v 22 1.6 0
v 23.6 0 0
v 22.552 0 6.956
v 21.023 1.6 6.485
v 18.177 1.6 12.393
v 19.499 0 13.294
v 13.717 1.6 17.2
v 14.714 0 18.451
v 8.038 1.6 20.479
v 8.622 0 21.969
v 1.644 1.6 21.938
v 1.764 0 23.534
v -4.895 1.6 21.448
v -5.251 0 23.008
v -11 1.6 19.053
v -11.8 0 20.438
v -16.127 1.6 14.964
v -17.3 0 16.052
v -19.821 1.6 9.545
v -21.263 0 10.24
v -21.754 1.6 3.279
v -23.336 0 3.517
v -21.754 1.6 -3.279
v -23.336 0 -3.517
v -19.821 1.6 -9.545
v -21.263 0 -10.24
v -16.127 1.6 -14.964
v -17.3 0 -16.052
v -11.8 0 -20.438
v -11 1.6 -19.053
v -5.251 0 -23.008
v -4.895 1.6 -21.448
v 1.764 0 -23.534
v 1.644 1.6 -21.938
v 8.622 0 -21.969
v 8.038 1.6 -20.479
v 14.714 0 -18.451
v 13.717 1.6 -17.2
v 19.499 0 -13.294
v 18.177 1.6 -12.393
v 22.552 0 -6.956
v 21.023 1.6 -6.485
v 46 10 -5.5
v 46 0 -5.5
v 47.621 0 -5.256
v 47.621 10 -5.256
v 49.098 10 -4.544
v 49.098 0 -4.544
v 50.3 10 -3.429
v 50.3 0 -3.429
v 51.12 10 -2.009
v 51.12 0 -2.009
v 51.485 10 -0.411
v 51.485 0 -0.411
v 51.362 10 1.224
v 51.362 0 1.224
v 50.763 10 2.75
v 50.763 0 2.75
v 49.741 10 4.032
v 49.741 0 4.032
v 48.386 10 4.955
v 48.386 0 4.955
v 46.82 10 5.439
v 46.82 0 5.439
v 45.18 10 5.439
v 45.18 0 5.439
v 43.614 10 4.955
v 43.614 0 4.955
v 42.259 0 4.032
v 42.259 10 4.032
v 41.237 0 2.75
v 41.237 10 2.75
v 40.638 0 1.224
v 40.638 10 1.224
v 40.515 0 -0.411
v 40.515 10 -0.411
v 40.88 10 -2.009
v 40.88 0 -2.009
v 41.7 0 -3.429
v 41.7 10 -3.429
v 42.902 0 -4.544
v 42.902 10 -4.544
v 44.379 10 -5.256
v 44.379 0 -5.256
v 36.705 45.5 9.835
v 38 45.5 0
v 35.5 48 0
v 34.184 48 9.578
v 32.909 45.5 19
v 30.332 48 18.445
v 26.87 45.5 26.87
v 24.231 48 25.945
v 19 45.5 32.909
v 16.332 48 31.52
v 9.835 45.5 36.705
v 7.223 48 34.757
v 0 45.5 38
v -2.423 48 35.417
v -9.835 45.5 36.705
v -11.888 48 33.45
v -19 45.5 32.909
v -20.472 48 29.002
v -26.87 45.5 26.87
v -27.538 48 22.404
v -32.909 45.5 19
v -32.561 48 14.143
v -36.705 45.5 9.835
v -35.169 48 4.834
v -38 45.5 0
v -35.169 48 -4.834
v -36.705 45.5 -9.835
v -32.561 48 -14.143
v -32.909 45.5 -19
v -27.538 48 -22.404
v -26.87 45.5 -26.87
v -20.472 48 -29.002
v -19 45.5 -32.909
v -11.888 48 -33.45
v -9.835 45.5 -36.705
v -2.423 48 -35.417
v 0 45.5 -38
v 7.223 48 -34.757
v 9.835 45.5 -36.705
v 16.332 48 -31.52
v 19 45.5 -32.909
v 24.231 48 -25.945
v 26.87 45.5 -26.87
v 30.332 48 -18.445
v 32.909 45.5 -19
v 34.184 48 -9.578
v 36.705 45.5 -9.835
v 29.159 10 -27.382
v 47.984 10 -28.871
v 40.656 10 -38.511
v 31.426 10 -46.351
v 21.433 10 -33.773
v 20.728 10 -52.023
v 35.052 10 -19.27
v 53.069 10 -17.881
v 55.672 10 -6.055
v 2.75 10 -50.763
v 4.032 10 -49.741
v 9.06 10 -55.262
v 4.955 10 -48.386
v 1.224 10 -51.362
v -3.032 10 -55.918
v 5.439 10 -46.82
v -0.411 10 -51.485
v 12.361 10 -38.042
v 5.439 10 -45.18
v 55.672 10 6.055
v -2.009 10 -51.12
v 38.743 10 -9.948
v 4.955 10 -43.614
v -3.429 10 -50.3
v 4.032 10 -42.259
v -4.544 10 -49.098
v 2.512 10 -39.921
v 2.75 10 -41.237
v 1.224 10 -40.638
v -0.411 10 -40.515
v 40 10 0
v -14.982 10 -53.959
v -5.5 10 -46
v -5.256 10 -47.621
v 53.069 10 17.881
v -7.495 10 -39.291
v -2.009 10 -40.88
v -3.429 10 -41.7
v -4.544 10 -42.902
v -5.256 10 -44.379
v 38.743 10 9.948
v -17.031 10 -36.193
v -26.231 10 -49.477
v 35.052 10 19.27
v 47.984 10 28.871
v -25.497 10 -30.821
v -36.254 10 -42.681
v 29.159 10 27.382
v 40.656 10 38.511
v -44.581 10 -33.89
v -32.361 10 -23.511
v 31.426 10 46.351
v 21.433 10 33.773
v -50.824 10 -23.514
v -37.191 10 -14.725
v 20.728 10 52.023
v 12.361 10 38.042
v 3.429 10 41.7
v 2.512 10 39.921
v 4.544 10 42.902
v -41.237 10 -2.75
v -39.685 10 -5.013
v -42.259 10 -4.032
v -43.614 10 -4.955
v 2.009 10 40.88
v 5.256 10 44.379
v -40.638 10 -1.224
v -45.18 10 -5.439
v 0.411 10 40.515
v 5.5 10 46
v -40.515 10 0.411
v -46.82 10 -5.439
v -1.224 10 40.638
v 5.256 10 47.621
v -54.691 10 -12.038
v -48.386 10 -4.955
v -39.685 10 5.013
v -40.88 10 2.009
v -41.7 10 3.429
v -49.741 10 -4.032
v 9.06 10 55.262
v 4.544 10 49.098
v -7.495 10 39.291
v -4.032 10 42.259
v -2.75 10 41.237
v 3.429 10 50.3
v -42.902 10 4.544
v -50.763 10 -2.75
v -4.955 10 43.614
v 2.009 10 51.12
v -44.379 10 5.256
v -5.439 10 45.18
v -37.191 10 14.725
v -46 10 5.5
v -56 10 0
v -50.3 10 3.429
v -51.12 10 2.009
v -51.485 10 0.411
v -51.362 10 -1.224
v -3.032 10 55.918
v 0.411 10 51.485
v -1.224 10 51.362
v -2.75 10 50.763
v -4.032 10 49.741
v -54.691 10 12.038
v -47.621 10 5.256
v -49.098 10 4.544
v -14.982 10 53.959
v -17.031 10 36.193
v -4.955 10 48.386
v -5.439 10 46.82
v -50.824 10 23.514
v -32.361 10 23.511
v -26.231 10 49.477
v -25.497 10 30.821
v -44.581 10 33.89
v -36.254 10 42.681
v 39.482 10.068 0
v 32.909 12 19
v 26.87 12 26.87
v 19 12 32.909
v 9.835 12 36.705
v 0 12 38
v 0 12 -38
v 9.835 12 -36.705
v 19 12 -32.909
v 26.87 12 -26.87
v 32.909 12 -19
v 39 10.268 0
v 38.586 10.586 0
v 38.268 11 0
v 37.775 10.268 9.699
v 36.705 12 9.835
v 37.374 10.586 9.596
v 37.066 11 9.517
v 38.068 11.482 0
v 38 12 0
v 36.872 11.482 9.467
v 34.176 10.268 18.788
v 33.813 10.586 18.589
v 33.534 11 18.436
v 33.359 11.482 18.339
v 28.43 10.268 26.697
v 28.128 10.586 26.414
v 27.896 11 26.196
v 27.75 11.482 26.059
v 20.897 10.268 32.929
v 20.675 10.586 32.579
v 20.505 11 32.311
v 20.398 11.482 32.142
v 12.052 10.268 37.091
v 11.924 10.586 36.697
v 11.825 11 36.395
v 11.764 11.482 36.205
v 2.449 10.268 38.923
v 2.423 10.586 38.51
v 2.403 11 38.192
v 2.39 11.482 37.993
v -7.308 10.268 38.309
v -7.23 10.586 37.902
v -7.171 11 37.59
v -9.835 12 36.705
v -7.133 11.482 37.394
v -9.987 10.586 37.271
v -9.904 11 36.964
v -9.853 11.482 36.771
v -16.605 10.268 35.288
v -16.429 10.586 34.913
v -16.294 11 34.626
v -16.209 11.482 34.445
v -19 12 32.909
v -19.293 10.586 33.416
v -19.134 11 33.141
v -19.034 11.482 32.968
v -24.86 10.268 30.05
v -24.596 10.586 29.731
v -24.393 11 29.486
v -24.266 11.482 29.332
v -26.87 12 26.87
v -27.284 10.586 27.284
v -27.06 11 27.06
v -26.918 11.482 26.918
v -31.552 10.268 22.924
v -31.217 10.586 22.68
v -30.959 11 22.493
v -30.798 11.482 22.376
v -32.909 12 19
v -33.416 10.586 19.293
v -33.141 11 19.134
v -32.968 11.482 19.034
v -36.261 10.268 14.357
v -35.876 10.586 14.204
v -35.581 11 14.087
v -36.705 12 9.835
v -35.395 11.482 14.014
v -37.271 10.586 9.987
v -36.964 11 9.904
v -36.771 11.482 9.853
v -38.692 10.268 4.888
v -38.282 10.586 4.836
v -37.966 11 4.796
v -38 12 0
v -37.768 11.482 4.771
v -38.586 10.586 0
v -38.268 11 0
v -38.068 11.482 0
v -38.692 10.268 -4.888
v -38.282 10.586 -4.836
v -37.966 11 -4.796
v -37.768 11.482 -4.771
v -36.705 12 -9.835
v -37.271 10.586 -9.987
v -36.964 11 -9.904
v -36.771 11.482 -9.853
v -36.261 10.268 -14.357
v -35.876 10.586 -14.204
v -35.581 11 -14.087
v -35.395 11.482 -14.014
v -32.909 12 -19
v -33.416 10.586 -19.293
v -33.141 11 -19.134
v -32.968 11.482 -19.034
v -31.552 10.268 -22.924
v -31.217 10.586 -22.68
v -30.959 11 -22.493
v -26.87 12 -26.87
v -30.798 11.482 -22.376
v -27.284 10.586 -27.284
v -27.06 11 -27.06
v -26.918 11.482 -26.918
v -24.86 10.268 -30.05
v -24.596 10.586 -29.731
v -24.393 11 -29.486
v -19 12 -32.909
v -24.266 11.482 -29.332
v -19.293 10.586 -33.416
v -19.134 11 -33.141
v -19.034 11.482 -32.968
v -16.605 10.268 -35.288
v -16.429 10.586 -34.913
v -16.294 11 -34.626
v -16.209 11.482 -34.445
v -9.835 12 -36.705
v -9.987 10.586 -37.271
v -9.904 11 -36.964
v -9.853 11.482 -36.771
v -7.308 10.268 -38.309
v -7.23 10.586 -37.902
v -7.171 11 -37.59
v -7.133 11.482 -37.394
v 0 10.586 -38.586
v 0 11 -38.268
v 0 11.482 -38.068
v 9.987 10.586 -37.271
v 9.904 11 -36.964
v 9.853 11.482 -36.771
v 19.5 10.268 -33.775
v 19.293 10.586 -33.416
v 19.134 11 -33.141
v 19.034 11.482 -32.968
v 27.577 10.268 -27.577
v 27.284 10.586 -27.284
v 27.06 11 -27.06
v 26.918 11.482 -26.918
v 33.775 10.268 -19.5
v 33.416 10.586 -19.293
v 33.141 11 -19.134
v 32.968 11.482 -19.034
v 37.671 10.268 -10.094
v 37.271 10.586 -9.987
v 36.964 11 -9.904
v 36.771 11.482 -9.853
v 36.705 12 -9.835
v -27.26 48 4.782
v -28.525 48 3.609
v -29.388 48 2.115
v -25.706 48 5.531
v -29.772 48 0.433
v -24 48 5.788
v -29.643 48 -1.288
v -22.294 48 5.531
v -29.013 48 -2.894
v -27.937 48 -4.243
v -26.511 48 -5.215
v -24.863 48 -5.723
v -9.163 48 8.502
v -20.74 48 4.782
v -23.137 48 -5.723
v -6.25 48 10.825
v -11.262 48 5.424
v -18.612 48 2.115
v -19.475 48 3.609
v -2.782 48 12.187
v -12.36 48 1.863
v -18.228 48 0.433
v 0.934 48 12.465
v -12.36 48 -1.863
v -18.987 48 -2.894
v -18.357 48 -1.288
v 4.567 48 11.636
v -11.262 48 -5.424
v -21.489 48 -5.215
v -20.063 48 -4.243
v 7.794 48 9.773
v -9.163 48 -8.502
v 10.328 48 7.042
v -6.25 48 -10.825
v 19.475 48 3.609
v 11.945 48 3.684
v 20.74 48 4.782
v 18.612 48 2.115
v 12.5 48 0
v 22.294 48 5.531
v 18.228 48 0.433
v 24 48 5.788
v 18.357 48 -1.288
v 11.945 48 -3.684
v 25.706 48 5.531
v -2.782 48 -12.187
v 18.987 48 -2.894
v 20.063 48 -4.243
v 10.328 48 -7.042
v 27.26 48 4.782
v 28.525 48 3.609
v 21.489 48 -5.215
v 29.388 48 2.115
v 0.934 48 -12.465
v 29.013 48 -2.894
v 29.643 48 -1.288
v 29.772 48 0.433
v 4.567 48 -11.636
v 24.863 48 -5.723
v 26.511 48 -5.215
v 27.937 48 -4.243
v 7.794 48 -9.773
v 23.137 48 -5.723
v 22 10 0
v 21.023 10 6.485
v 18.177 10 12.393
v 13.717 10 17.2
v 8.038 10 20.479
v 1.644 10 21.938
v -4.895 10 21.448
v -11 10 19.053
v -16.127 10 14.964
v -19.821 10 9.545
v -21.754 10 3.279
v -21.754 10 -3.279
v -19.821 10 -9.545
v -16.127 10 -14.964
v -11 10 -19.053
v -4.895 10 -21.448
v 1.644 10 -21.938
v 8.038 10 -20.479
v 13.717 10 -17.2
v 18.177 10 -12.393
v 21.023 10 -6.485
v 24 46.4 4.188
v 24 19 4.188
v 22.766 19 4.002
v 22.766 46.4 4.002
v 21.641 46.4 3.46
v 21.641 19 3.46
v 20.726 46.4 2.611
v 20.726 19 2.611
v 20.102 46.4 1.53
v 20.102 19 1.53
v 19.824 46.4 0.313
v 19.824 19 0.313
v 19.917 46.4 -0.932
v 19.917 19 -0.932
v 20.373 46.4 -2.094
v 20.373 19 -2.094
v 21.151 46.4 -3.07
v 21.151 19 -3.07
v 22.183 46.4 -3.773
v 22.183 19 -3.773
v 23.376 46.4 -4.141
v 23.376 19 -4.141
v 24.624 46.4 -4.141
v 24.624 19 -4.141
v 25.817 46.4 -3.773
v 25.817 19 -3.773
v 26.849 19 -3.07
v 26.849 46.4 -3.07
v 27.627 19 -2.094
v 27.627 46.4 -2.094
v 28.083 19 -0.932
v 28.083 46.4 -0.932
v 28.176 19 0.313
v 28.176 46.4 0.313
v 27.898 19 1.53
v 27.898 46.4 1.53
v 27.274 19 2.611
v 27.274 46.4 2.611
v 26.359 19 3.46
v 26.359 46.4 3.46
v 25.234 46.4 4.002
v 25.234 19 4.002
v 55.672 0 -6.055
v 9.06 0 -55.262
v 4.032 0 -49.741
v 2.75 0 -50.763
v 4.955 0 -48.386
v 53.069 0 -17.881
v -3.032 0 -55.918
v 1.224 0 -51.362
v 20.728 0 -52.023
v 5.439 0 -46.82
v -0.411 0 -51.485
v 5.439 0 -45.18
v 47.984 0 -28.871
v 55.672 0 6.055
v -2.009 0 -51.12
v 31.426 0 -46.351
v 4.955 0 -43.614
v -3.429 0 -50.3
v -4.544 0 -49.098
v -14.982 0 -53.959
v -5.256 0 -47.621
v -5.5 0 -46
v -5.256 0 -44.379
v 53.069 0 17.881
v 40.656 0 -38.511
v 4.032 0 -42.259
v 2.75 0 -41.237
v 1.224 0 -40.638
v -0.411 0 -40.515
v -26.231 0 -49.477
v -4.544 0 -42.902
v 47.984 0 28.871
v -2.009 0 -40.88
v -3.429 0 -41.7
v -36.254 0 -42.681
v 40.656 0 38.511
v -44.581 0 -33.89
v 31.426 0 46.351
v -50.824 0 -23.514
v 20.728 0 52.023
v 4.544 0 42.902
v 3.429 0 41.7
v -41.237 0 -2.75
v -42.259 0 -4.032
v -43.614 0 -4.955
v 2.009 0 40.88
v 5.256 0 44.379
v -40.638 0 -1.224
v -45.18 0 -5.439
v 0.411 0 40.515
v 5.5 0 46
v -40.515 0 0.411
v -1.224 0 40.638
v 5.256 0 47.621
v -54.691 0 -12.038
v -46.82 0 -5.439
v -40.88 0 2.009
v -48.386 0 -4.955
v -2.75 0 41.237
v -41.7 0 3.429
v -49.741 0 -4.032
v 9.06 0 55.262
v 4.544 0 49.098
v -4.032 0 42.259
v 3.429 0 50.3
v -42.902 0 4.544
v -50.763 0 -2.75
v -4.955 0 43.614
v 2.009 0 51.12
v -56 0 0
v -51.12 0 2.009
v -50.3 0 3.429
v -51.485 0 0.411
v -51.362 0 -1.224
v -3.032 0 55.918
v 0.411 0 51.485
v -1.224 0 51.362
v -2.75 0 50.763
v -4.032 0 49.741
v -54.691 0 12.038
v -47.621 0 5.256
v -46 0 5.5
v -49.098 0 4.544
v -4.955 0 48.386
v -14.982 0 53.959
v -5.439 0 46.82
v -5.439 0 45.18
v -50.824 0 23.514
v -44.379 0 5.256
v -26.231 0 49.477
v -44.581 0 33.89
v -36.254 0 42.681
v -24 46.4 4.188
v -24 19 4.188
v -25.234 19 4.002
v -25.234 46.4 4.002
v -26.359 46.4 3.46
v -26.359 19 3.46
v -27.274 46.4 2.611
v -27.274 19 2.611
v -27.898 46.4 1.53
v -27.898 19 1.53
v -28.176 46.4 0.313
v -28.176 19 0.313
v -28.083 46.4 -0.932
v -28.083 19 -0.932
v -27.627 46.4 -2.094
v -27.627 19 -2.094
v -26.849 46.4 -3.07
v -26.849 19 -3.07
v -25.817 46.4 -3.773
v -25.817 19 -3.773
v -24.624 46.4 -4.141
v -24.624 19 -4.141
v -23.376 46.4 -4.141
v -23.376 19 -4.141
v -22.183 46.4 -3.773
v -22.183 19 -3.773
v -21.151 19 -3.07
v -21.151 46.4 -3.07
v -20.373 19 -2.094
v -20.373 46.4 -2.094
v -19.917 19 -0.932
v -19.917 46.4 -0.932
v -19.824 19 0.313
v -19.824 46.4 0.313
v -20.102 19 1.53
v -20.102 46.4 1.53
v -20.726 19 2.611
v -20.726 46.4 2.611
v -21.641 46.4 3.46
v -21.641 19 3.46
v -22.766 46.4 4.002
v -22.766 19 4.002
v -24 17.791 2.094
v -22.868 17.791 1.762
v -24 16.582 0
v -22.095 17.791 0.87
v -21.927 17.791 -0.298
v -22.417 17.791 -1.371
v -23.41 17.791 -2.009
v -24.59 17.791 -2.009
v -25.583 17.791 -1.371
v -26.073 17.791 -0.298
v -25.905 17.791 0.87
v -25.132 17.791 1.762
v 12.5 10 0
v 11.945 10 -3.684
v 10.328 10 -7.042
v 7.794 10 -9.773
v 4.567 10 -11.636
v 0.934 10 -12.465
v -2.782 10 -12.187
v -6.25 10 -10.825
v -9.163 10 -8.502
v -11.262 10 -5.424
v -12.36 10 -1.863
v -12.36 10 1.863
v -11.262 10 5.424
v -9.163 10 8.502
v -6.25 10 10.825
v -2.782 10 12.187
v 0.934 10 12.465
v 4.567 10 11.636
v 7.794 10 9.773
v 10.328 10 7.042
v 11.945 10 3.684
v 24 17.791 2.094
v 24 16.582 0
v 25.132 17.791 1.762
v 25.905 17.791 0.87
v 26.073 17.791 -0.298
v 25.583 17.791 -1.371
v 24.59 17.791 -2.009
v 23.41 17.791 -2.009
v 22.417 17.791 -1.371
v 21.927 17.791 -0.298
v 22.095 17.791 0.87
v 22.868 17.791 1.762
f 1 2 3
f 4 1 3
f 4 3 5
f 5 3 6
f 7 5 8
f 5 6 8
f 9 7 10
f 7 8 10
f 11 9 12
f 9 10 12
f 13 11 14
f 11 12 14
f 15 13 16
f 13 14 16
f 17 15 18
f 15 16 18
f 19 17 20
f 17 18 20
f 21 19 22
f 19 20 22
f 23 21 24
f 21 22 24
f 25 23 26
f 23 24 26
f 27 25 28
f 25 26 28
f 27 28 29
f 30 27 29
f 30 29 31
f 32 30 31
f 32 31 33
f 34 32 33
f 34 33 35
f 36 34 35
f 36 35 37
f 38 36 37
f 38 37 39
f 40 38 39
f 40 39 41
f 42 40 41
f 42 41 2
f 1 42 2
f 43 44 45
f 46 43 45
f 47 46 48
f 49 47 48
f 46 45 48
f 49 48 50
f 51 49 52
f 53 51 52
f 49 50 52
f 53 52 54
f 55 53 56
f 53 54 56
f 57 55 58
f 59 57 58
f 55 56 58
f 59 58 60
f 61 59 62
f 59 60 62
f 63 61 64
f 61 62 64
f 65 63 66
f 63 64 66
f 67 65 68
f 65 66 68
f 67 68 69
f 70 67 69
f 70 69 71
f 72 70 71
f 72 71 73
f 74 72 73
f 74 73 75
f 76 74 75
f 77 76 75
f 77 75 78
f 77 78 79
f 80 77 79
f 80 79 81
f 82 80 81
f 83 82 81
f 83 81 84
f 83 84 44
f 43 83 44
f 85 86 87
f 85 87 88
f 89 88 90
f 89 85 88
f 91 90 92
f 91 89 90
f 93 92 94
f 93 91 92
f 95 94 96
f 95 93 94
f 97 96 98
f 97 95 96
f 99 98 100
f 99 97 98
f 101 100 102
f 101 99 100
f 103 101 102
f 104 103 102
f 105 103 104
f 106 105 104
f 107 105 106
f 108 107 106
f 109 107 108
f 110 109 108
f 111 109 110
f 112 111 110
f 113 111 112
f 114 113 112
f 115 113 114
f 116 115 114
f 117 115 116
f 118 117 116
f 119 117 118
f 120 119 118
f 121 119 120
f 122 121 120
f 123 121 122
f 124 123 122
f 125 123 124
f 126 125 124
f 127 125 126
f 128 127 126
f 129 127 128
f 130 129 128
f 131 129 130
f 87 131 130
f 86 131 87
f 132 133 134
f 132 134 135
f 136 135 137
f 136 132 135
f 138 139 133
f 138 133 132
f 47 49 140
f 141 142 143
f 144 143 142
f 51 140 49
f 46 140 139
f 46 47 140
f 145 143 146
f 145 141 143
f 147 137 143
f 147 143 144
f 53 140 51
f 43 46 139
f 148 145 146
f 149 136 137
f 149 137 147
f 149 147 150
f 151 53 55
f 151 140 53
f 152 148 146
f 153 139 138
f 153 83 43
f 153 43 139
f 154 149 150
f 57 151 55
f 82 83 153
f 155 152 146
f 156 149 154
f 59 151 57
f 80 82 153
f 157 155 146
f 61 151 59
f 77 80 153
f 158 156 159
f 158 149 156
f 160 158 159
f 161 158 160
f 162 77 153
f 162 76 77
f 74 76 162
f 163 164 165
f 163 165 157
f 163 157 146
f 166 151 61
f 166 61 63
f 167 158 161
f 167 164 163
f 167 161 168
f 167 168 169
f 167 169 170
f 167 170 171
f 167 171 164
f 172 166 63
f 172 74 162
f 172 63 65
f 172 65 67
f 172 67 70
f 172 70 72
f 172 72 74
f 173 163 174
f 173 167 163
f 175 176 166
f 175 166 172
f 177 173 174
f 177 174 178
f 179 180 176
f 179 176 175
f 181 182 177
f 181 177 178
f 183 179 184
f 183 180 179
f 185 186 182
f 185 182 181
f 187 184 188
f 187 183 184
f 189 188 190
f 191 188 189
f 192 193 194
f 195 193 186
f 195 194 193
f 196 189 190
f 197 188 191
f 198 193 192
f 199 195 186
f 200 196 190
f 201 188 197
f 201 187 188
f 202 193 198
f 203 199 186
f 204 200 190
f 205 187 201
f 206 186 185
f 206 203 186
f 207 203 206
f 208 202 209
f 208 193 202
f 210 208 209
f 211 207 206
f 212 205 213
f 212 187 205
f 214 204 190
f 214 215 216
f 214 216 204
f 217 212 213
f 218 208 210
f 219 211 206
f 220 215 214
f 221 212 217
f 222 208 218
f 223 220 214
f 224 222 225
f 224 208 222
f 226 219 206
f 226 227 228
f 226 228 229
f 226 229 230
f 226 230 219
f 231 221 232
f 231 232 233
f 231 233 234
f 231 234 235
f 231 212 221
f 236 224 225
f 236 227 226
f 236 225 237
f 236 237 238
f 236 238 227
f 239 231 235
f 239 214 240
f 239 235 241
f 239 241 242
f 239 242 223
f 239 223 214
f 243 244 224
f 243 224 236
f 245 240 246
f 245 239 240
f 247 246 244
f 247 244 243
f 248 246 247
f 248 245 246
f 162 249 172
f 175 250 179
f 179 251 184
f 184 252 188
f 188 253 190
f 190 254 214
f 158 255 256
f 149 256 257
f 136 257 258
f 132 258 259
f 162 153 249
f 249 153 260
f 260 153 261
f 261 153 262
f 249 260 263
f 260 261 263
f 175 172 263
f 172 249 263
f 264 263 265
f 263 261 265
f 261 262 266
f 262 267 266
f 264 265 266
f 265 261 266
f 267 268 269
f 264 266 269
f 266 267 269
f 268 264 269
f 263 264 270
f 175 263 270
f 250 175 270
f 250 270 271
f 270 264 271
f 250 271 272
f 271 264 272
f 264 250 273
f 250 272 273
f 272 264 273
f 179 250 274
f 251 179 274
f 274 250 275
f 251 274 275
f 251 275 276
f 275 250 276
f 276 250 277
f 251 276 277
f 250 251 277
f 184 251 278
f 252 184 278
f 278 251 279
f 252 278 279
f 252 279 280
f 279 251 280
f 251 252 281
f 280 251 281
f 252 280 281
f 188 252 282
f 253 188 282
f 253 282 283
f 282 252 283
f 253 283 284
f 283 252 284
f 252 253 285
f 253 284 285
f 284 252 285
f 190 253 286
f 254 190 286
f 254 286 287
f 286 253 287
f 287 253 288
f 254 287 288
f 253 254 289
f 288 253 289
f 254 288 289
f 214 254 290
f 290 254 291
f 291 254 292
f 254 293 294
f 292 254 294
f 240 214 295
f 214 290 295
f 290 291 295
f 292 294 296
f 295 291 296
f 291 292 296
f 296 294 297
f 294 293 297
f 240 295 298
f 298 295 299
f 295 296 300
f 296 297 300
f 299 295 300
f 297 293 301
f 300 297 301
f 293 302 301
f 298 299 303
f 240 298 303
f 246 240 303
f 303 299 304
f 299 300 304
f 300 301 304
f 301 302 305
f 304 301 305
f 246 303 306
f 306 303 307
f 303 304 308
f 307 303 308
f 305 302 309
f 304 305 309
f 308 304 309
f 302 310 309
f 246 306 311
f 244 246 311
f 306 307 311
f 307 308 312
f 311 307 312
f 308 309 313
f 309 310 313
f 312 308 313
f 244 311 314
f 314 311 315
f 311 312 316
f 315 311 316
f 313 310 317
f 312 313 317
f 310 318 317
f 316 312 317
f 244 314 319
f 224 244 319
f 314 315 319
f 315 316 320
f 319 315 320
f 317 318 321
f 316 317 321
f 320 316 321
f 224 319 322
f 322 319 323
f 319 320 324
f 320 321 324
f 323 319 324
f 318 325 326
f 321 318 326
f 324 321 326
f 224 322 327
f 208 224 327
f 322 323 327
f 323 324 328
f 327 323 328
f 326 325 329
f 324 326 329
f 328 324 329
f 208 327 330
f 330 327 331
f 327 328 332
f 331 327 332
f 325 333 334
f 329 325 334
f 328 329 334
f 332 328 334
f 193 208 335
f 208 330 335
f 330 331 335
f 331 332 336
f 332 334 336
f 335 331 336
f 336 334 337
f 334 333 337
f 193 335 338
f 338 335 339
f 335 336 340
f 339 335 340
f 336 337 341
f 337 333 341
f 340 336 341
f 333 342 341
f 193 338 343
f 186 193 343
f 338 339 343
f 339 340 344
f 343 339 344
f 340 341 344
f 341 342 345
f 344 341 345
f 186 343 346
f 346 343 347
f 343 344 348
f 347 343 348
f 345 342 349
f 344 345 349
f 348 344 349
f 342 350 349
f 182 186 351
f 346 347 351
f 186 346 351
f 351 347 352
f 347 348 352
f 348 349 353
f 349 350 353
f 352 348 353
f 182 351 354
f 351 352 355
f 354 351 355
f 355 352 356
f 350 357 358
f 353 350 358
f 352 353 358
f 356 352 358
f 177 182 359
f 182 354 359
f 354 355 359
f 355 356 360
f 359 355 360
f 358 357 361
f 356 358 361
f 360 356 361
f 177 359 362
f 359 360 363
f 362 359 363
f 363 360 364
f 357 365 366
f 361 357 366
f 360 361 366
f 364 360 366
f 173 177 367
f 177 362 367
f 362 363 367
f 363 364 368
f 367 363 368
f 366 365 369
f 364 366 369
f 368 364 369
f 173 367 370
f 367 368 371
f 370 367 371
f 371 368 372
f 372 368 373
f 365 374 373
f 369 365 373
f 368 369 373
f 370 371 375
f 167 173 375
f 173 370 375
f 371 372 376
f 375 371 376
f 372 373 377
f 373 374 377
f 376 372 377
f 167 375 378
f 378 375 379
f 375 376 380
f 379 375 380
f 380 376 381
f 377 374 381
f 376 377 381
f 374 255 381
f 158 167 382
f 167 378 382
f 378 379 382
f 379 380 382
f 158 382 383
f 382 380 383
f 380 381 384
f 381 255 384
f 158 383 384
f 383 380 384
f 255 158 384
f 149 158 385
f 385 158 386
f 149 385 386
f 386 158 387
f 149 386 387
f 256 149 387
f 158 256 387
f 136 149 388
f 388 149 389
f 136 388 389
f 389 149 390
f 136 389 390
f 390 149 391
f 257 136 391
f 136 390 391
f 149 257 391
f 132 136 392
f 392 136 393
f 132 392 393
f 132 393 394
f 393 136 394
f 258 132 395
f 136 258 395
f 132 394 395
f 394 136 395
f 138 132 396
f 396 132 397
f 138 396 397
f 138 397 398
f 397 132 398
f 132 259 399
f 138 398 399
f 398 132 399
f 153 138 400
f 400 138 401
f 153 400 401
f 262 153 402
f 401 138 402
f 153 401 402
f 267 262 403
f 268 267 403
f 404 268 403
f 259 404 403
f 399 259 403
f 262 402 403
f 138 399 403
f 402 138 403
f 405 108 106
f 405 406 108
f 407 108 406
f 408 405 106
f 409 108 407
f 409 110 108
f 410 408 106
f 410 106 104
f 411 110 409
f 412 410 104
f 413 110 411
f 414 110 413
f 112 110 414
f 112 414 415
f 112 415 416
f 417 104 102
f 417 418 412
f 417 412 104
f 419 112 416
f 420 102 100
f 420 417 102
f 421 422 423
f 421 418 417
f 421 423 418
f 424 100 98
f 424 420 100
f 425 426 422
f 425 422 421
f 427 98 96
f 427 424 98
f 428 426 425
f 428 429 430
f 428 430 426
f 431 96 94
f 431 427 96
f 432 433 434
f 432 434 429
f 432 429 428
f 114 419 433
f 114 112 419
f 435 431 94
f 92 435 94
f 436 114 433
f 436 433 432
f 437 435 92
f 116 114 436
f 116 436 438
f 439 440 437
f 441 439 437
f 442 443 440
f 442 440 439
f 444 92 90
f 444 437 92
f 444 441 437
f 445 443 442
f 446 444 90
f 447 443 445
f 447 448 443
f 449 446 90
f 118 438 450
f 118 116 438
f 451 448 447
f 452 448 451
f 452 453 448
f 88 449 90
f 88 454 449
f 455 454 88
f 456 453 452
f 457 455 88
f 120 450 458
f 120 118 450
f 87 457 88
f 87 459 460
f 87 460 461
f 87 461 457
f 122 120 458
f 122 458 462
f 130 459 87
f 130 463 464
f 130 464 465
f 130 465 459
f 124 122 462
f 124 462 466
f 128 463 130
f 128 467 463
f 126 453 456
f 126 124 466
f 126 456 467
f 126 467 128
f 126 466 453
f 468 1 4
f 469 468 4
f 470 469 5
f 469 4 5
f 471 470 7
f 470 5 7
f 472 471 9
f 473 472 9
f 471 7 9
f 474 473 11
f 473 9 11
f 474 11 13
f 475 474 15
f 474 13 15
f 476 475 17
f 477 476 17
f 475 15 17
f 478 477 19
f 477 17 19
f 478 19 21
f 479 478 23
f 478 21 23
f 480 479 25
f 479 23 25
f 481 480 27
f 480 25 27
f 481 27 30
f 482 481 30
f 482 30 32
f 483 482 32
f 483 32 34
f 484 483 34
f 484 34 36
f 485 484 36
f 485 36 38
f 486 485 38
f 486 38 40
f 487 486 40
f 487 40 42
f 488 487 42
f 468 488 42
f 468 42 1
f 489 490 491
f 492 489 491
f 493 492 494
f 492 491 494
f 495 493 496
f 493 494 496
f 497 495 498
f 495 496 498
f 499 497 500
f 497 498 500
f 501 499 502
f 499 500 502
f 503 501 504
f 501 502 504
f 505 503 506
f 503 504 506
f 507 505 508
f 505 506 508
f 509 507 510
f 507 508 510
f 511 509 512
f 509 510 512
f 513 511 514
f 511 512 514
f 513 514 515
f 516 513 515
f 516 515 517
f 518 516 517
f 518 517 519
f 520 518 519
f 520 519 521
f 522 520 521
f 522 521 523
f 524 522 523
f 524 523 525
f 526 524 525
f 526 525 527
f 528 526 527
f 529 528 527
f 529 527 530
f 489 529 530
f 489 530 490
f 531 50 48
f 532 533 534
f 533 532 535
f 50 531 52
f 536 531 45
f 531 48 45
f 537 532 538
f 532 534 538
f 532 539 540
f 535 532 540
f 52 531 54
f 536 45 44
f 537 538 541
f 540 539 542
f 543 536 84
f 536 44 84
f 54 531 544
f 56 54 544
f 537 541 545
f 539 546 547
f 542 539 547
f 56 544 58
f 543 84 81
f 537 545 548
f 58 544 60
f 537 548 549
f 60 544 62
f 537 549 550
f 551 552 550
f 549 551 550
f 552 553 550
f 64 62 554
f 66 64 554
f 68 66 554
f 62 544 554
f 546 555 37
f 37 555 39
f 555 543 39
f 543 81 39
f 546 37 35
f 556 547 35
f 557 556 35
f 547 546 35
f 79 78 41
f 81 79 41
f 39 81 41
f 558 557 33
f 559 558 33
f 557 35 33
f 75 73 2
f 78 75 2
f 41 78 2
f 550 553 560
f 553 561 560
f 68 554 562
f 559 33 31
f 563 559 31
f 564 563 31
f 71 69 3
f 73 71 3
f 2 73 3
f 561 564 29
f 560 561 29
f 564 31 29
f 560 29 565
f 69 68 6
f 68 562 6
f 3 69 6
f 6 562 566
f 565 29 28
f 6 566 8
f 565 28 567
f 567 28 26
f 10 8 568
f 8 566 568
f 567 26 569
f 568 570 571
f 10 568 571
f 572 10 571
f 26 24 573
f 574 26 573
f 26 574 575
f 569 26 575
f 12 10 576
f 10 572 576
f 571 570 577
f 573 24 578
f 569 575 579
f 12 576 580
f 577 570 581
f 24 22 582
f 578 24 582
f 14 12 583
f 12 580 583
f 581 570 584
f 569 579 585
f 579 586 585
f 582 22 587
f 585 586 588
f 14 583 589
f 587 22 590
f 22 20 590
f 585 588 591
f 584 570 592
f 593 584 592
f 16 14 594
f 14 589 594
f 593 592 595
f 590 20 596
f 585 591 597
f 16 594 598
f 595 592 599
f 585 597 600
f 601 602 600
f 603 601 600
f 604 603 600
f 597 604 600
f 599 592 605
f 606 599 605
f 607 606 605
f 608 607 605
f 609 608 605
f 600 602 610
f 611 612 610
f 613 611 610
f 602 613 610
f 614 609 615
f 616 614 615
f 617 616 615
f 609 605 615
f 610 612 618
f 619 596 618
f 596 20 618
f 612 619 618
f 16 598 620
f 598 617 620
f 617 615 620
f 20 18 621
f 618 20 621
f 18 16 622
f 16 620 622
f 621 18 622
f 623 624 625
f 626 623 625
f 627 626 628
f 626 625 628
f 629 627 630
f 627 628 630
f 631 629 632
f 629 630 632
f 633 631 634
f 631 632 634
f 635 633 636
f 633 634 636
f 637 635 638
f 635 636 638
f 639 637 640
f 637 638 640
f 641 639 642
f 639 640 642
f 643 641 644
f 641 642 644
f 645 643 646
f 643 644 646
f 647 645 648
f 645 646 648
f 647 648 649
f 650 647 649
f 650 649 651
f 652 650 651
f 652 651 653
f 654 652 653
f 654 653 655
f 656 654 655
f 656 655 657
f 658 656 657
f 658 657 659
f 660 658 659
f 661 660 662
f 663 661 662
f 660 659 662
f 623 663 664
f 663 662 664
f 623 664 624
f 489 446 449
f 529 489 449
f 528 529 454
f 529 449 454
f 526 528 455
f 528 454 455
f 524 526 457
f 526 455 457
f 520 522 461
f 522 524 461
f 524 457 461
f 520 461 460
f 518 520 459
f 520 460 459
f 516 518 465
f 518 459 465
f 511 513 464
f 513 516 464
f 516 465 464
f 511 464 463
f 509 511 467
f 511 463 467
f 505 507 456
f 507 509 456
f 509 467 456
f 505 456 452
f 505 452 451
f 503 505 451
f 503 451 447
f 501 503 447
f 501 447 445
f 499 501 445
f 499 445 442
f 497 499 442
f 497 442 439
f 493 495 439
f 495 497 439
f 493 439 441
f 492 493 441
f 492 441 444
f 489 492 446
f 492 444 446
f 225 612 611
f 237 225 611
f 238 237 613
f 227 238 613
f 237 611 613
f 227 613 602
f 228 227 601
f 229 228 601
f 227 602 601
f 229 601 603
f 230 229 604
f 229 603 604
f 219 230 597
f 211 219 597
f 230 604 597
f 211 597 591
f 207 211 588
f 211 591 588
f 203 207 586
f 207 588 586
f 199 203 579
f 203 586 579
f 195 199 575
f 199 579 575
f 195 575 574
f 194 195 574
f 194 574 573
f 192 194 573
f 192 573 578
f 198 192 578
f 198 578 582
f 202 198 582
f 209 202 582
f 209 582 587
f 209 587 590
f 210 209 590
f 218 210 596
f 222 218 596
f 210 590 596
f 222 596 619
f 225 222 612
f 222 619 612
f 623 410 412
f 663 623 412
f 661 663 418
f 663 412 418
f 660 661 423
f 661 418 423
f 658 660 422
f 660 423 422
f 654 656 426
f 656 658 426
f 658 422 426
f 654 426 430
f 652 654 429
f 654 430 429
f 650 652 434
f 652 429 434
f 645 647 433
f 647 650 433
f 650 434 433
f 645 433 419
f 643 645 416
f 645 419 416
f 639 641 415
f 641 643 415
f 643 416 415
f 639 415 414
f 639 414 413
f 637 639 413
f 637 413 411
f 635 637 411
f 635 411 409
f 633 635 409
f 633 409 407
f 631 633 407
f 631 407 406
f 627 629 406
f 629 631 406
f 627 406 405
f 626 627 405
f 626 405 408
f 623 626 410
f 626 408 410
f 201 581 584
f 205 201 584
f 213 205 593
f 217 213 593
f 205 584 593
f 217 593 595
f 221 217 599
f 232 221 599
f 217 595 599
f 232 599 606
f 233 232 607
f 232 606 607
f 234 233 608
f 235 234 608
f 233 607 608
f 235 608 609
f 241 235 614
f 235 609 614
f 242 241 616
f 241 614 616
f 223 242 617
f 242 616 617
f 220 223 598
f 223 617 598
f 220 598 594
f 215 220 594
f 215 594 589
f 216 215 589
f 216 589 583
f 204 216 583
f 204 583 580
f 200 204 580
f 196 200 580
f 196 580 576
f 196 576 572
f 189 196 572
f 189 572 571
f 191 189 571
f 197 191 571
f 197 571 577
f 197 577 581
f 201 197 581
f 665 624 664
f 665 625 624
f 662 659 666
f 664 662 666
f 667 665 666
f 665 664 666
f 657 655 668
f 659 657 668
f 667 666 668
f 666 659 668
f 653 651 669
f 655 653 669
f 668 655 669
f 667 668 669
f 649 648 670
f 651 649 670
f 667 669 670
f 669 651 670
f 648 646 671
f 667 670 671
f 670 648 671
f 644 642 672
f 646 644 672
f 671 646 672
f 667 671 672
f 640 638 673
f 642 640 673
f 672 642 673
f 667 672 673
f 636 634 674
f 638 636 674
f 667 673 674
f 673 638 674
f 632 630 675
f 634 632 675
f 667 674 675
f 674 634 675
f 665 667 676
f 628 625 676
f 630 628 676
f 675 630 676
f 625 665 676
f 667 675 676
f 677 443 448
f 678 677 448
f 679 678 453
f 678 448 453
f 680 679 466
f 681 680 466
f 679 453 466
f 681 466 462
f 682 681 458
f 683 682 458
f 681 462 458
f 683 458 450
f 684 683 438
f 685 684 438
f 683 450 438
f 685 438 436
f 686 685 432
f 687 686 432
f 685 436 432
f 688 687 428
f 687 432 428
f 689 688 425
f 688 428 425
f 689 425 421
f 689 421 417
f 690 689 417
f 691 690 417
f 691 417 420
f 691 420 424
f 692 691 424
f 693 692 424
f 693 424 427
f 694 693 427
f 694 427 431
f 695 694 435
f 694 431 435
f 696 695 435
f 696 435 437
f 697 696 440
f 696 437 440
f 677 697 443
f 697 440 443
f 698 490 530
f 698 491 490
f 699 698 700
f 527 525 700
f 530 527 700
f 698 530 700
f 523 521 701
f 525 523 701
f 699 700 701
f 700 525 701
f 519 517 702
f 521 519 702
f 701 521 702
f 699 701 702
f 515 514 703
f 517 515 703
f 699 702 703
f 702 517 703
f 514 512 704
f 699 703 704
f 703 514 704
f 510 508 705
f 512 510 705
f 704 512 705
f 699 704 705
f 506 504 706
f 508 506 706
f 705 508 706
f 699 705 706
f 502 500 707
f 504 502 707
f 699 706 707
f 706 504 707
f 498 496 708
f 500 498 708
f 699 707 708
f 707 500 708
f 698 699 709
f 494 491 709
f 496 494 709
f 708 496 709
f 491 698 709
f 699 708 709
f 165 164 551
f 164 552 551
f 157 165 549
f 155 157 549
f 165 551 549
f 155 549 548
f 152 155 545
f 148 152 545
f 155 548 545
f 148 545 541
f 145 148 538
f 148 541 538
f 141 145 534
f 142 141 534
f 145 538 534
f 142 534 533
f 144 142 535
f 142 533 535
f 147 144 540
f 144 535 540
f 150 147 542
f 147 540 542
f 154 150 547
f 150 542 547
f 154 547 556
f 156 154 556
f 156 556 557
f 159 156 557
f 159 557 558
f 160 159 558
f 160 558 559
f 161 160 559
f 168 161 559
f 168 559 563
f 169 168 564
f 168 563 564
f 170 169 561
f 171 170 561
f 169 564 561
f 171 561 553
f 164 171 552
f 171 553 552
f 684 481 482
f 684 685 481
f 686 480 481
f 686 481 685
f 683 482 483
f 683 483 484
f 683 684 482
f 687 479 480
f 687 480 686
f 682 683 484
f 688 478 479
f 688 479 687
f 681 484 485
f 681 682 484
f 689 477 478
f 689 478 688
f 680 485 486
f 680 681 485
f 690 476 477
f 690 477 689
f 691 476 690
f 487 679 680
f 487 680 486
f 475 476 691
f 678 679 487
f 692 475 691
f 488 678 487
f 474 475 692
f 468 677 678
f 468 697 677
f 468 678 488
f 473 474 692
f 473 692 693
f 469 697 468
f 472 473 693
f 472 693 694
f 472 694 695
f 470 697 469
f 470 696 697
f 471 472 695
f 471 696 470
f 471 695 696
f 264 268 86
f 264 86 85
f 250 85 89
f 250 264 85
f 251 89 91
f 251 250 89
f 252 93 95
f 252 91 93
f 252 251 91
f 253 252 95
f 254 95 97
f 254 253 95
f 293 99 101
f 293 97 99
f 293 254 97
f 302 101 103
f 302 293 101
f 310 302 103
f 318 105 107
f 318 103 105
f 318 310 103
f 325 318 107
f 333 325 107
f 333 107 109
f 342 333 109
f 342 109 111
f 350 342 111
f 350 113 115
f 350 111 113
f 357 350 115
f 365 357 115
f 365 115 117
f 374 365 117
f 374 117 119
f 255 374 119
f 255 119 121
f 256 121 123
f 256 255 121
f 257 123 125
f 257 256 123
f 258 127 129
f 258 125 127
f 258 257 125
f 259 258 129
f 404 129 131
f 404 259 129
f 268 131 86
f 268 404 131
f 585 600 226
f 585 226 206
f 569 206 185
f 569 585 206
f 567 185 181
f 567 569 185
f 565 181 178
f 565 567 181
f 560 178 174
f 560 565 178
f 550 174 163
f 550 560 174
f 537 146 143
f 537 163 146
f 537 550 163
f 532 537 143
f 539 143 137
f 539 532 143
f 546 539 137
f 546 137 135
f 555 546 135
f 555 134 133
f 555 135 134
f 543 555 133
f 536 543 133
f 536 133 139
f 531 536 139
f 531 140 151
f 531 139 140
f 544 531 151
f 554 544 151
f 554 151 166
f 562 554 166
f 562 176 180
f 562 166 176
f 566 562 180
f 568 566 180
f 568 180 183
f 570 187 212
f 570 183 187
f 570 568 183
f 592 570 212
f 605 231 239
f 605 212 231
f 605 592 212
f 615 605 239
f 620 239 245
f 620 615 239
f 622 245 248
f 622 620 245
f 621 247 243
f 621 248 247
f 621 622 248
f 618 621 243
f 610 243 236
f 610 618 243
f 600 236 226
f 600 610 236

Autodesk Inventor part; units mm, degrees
ref_plane "YZ Plane" through (0, 0, 0) normal (1, 0, 0) x (0, 1, 0)
ref_plane "XZ Plane" through (0, 0, 0) normal (0, 1, 0) x (-1, 0, 0)
ref_plane "XY Plane" through (0, 0, 0) normal (0, 0, 1) x (1, 0, 0)
sketch "Эскиз1" plane through (0, 0, 0) normal (0, 1, 0) x (-1, 0, 0)
  circle A0 centre (0, 0) radius 56
  dimension "d0" = 112
extrude "Выдавливание1" add sketch "Эскиз1" along normal blind 10
sketch "Эскиз2" plane through (0, 10, 0) normal (0, 1, 0) x (1, 0, 0)
  circle A0 centre (0, 0) radius 38
  dimension "d3" = 76
extrude "Выдавливание2" add sketch "Эскиз2" along normal blind 38
sketch "Эскиз3" plane through (0, 10, 0) normal (0, 1, 0) x (1, 0, 0)
  point P0 (0, 0)
  point P1 (-46, 0)
  dimension "d8" = 46
hole "Отверстие1" at (-46, 10, 0) direction (0, -1, 0) diameter 11 end through all
pattern_circular "Круговой массив1" count 4 over 360 about axis through (0, -10, 0) along (0, 1, 0) of "Отверстие1"
sketch "Эскиз4" plane through (0, 0, 0) normal (0, -1, 0) x (1, 0, 0)
  circle A0 centre (0, 0) radius 22
  dimension "d19" = 44
extrude "Выдавливание3" cut sketch "Эскиз4" against normal blind 10
sketch "Эскиз5" plane through (0, 48, 0) normal (0, 1, 0) x (1, 0, 0)
  circle A0 centre (0, 0) radius 12.5
  dimension "d22" = 25
extrude "Выдавливание4" cut sketch "Эскиз5" against normal through all
fillet "Сопряжение1" radius 2 1 edges at (-38, 10, 0)
chamfer "Фаска1" distance 1.6 angle 45 1 edges at (-22, 0, 0)
chamfer "Фаска2" distance 2.5 angle 45 1 edges at (-38, 48, 0)
sketch "Эскиз6" plane through (0, 48, 0) normal (0, 1, 0) x (1, 0, 0)
  point P0 (0, 0)
  point P1 (-24, 0)
  point P2 (24, 0)
  dimension "d32" = 24
  dimension "d33" = 48
hole "Отверстие2" at (-24, 48, 0) at (24, 48, 0) direction (0, -1, 0) diameter 8.376 depth 29 tip angle 120 thread size "M10x1.5" class "6H" standard "ISO Metric profile"
chamfer "Фаска3" distance 1.6 angle 45 2 edges at (-24, 48, -4.188) (24, 48, -4.188)
properties part number "Фланецц"
